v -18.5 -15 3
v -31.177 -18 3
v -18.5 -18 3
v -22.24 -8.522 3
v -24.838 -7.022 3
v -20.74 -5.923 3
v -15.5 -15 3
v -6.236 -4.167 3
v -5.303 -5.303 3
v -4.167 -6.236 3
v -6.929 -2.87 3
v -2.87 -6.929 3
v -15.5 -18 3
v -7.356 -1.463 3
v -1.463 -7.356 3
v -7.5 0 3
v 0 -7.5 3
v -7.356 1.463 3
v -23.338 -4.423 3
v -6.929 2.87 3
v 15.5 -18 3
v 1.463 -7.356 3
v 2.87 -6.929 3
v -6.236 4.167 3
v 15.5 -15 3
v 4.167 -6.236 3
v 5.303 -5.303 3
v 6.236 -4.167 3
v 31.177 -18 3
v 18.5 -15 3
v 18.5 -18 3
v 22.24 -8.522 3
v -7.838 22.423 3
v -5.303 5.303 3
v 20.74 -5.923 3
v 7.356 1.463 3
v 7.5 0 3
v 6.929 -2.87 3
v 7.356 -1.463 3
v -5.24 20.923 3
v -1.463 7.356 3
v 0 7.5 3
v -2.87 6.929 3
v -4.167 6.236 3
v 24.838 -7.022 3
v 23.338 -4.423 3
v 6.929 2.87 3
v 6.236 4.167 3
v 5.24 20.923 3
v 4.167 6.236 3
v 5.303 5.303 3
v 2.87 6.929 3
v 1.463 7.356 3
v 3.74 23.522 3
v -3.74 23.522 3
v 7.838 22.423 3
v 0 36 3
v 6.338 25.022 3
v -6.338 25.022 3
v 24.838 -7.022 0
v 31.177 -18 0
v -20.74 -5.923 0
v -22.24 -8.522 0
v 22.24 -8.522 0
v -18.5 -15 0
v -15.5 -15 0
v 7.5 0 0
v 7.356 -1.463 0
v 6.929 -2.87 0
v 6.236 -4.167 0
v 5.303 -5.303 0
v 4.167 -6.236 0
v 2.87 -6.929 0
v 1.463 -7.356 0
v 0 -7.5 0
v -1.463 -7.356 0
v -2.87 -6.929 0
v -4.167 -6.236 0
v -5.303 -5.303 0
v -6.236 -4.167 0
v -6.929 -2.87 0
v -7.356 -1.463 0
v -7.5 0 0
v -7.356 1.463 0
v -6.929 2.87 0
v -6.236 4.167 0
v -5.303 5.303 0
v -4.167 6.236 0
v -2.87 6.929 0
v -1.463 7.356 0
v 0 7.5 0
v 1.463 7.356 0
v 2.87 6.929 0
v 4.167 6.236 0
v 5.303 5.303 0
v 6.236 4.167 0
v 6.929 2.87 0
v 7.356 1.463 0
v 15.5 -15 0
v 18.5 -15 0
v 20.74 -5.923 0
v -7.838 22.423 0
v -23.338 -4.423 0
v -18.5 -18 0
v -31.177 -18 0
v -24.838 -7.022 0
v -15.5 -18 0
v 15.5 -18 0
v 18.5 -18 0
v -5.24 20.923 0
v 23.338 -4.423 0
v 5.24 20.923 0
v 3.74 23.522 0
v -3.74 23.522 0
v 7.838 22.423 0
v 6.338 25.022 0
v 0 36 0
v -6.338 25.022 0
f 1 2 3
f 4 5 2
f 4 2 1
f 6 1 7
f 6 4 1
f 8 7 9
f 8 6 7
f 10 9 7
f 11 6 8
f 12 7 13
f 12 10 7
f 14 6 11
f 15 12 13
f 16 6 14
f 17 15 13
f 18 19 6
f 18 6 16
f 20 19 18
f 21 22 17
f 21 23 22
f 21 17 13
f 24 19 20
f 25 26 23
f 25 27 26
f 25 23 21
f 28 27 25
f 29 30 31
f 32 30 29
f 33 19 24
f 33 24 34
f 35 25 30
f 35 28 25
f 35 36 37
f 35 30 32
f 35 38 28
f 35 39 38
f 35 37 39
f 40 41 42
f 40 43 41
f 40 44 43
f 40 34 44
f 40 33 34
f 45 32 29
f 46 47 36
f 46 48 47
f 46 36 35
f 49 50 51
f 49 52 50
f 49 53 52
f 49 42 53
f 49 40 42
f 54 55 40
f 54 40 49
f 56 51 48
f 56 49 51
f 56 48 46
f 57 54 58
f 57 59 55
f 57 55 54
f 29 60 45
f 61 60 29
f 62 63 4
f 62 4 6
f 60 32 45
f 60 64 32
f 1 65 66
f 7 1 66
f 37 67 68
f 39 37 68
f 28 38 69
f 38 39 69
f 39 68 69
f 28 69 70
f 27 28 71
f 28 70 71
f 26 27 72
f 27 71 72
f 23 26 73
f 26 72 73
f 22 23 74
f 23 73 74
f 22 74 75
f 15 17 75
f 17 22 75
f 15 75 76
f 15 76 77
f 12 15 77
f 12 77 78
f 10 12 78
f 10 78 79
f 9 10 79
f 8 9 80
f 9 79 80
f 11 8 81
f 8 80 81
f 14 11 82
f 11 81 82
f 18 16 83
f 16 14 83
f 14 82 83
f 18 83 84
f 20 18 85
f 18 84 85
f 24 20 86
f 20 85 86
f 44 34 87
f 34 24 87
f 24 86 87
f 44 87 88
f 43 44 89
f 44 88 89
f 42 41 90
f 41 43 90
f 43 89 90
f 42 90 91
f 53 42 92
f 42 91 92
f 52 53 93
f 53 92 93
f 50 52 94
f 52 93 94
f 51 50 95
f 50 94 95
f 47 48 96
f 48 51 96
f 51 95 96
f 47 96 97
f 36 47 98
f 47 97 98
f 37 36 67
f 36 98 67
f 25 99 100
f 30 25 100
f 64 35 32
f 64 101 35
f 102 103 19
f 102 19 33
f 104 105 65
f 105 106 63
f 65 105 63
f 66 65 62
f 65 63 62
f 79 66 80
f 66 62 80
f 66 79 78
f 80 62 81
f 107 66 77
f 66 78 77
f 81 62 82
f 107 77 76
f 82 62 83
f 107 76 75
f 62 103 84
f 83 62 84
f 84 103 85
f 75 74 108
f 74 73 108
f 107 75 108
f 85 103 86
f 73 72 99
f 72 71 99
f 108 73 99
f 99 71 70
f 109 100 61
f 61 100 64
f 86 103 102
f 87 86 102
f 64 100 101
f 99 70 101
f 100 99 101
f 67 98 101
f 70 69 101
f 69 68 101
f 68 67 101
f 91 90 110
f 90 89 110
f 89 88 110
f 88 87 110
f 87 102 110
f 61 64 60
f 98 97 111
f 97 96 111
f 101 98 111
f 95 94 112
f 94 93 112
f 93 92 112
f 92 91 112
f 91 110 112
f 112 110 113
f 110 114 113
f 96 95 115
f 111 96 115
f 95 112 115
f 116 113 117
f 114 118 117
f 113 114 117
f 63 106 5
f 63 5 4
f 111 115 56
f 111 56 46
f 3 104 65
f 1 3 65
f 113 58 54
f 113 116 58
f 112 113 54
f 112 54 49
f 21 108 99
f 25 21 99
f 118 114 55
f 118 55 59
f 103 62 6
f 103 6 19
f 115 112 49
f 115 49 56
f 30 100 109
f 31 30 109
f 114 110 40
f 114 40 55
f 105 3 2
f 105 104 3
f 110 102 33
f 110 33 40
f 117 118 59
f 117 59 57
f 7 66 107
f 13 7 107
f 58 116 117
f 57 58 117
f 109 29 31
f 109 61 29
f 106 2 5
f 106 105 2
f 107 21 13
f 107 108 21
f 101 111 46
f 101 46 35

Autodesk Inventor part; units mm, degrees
ref_plane "YZ Plane" through (0, 0, 0) normal (1, 0, 0) x (0, 1, 0)
ref_plane "XZ Plane" through (0, 0, 0) normal (0, 1, 0) x (-1, 0, 0)
ref_plane "XY Plane" through (0, 0, 0) normal (0, 0, 1) x (1, 0, 0)
sketch "Sketch1" plane through (0, 0, 0) normal (0, 0, 1) x (1, 0, 0)
  circle A0 centre (0, 0) radius 7.5
  line L0 (31.1769, -18) -> (-31.1769, -18) construction
  line L1 (-31.1769, -18) -> (0, 36) construction
  line L2 (0, 36) -> (31.1769, -18) construction
  line L3 (15.5, -18) -> (15.5, -15)
  line L4 (15.5, -15) -> (18.5, -15)
  line L5 (18.5, -15) -> (18.5, -18)
  line L6 (-18.5, -18) -> (-18.5, -15)
  line L7 (-18.5, -15) -> (-15.5, -15)
  line L8 (-15.5, -15) -> (-15.5, -18)
  line L9 (-31.1769, -18) -> (15.5885, 9) construction
  line L10 (31.1769, -18) -> (-15.5885, 9) construction
  line L11 (0, 36) -> (0, -18) construction
  line L12 (6.3385, 25.0215) -> (3.7404, 23.5215)
  line L13 (3.7404, 23.5215) -> (5.2404, 20.9234)
  line L14 (5.2404, 20.9234) -> (7.8385, 22.4234)
  line L15 (23.3385, -4.4234) -> (20.7404, -5.9234)
  line L16 (20.7404, -5.9234) -> (22.2404, -8.5215)
  line L17 (22.2404, -8.5215) -> (24.8385, -7.0215)
  line L18 (-24.8385, -7.0215) -> (-22.2404, -8.5215)
  line L19 (-22.2404, -8.5215) -> (-20.7404, -5.9234)
  line L20 (-20.7404, -5.9234) -> (-23.3385, -4.4234)
  line L21 (-7.8385, 22.4234) -> (-5.2404, 20.9234)
  line L22 (-5.2404, 20.9234) -> (-3.7404, 23.5215)
  line L23 (-3.7404, 23.5215) -> (-6.3385, 25.0215)
  line L24 (-6.3385, 25.0215) -> (0, 36)
  line L25 (6.3385, 25.0215) -> (0, 36)
  line L26 (7.8385, 22.4234) -> (23.3385, -4.4234)
  line L27 (24.8385, -7.0215) -> (31.1769, -18)
  line L28 (31.1769, -18) -> (18.5, -18)
  line L29 (15.5, -18) -> (-15.5, -18)
  line L30 (-18.5, -18) -> (-31.1769, -18)
  line L31 (-31.1769, -18) -> (-24.8385, -7.0215)
  line L32 (-23.3385, -4.4234) -> (-7.8385, 22.4234)
  dimension "d3" = 15
  dimension "d4" = 18.5
  dimension "d5" = 18.5
  dimension "d8" = 3
  dimension "d9" = 18
  dimension "d10" = 3
  dimension "d11" = 3
  dimension "d12" = 18.5
  dimension "d13" = 3
  dimension "d14" = 3
  dimension "d15" = 18.5
  dimension "d16" = 3
  dimension "d17" = 3
  dimension "d18" = 18.5
  dimension "d19" = 3
  dimension "d20" = 3
  dimension "d21" = 3
  dimension "d22" = 18.5
  dimension "d23" = 3
extrude "Extrusion2" add sketch "Sketch1" along normal blind 3
equation "\"d5\" = d4"
equation "\"d11\" = d10"
equation "\"d12\" = d4"
equation "\"d13\" = d10"
equation "\"d14\" = d8"
equation "\"d15\" = d4"
equation "\"d16\" = d13"
equation "\"d17\" = d8"
equation "\"d18\" = d4"
equation "\"d19\" = d10"
equation "\"d20\" = d8"
equation "\"d21\" = d8"
equation "\"d22\" = d4"
equation "\"d23\" = d10"
properties part number "actuator"
